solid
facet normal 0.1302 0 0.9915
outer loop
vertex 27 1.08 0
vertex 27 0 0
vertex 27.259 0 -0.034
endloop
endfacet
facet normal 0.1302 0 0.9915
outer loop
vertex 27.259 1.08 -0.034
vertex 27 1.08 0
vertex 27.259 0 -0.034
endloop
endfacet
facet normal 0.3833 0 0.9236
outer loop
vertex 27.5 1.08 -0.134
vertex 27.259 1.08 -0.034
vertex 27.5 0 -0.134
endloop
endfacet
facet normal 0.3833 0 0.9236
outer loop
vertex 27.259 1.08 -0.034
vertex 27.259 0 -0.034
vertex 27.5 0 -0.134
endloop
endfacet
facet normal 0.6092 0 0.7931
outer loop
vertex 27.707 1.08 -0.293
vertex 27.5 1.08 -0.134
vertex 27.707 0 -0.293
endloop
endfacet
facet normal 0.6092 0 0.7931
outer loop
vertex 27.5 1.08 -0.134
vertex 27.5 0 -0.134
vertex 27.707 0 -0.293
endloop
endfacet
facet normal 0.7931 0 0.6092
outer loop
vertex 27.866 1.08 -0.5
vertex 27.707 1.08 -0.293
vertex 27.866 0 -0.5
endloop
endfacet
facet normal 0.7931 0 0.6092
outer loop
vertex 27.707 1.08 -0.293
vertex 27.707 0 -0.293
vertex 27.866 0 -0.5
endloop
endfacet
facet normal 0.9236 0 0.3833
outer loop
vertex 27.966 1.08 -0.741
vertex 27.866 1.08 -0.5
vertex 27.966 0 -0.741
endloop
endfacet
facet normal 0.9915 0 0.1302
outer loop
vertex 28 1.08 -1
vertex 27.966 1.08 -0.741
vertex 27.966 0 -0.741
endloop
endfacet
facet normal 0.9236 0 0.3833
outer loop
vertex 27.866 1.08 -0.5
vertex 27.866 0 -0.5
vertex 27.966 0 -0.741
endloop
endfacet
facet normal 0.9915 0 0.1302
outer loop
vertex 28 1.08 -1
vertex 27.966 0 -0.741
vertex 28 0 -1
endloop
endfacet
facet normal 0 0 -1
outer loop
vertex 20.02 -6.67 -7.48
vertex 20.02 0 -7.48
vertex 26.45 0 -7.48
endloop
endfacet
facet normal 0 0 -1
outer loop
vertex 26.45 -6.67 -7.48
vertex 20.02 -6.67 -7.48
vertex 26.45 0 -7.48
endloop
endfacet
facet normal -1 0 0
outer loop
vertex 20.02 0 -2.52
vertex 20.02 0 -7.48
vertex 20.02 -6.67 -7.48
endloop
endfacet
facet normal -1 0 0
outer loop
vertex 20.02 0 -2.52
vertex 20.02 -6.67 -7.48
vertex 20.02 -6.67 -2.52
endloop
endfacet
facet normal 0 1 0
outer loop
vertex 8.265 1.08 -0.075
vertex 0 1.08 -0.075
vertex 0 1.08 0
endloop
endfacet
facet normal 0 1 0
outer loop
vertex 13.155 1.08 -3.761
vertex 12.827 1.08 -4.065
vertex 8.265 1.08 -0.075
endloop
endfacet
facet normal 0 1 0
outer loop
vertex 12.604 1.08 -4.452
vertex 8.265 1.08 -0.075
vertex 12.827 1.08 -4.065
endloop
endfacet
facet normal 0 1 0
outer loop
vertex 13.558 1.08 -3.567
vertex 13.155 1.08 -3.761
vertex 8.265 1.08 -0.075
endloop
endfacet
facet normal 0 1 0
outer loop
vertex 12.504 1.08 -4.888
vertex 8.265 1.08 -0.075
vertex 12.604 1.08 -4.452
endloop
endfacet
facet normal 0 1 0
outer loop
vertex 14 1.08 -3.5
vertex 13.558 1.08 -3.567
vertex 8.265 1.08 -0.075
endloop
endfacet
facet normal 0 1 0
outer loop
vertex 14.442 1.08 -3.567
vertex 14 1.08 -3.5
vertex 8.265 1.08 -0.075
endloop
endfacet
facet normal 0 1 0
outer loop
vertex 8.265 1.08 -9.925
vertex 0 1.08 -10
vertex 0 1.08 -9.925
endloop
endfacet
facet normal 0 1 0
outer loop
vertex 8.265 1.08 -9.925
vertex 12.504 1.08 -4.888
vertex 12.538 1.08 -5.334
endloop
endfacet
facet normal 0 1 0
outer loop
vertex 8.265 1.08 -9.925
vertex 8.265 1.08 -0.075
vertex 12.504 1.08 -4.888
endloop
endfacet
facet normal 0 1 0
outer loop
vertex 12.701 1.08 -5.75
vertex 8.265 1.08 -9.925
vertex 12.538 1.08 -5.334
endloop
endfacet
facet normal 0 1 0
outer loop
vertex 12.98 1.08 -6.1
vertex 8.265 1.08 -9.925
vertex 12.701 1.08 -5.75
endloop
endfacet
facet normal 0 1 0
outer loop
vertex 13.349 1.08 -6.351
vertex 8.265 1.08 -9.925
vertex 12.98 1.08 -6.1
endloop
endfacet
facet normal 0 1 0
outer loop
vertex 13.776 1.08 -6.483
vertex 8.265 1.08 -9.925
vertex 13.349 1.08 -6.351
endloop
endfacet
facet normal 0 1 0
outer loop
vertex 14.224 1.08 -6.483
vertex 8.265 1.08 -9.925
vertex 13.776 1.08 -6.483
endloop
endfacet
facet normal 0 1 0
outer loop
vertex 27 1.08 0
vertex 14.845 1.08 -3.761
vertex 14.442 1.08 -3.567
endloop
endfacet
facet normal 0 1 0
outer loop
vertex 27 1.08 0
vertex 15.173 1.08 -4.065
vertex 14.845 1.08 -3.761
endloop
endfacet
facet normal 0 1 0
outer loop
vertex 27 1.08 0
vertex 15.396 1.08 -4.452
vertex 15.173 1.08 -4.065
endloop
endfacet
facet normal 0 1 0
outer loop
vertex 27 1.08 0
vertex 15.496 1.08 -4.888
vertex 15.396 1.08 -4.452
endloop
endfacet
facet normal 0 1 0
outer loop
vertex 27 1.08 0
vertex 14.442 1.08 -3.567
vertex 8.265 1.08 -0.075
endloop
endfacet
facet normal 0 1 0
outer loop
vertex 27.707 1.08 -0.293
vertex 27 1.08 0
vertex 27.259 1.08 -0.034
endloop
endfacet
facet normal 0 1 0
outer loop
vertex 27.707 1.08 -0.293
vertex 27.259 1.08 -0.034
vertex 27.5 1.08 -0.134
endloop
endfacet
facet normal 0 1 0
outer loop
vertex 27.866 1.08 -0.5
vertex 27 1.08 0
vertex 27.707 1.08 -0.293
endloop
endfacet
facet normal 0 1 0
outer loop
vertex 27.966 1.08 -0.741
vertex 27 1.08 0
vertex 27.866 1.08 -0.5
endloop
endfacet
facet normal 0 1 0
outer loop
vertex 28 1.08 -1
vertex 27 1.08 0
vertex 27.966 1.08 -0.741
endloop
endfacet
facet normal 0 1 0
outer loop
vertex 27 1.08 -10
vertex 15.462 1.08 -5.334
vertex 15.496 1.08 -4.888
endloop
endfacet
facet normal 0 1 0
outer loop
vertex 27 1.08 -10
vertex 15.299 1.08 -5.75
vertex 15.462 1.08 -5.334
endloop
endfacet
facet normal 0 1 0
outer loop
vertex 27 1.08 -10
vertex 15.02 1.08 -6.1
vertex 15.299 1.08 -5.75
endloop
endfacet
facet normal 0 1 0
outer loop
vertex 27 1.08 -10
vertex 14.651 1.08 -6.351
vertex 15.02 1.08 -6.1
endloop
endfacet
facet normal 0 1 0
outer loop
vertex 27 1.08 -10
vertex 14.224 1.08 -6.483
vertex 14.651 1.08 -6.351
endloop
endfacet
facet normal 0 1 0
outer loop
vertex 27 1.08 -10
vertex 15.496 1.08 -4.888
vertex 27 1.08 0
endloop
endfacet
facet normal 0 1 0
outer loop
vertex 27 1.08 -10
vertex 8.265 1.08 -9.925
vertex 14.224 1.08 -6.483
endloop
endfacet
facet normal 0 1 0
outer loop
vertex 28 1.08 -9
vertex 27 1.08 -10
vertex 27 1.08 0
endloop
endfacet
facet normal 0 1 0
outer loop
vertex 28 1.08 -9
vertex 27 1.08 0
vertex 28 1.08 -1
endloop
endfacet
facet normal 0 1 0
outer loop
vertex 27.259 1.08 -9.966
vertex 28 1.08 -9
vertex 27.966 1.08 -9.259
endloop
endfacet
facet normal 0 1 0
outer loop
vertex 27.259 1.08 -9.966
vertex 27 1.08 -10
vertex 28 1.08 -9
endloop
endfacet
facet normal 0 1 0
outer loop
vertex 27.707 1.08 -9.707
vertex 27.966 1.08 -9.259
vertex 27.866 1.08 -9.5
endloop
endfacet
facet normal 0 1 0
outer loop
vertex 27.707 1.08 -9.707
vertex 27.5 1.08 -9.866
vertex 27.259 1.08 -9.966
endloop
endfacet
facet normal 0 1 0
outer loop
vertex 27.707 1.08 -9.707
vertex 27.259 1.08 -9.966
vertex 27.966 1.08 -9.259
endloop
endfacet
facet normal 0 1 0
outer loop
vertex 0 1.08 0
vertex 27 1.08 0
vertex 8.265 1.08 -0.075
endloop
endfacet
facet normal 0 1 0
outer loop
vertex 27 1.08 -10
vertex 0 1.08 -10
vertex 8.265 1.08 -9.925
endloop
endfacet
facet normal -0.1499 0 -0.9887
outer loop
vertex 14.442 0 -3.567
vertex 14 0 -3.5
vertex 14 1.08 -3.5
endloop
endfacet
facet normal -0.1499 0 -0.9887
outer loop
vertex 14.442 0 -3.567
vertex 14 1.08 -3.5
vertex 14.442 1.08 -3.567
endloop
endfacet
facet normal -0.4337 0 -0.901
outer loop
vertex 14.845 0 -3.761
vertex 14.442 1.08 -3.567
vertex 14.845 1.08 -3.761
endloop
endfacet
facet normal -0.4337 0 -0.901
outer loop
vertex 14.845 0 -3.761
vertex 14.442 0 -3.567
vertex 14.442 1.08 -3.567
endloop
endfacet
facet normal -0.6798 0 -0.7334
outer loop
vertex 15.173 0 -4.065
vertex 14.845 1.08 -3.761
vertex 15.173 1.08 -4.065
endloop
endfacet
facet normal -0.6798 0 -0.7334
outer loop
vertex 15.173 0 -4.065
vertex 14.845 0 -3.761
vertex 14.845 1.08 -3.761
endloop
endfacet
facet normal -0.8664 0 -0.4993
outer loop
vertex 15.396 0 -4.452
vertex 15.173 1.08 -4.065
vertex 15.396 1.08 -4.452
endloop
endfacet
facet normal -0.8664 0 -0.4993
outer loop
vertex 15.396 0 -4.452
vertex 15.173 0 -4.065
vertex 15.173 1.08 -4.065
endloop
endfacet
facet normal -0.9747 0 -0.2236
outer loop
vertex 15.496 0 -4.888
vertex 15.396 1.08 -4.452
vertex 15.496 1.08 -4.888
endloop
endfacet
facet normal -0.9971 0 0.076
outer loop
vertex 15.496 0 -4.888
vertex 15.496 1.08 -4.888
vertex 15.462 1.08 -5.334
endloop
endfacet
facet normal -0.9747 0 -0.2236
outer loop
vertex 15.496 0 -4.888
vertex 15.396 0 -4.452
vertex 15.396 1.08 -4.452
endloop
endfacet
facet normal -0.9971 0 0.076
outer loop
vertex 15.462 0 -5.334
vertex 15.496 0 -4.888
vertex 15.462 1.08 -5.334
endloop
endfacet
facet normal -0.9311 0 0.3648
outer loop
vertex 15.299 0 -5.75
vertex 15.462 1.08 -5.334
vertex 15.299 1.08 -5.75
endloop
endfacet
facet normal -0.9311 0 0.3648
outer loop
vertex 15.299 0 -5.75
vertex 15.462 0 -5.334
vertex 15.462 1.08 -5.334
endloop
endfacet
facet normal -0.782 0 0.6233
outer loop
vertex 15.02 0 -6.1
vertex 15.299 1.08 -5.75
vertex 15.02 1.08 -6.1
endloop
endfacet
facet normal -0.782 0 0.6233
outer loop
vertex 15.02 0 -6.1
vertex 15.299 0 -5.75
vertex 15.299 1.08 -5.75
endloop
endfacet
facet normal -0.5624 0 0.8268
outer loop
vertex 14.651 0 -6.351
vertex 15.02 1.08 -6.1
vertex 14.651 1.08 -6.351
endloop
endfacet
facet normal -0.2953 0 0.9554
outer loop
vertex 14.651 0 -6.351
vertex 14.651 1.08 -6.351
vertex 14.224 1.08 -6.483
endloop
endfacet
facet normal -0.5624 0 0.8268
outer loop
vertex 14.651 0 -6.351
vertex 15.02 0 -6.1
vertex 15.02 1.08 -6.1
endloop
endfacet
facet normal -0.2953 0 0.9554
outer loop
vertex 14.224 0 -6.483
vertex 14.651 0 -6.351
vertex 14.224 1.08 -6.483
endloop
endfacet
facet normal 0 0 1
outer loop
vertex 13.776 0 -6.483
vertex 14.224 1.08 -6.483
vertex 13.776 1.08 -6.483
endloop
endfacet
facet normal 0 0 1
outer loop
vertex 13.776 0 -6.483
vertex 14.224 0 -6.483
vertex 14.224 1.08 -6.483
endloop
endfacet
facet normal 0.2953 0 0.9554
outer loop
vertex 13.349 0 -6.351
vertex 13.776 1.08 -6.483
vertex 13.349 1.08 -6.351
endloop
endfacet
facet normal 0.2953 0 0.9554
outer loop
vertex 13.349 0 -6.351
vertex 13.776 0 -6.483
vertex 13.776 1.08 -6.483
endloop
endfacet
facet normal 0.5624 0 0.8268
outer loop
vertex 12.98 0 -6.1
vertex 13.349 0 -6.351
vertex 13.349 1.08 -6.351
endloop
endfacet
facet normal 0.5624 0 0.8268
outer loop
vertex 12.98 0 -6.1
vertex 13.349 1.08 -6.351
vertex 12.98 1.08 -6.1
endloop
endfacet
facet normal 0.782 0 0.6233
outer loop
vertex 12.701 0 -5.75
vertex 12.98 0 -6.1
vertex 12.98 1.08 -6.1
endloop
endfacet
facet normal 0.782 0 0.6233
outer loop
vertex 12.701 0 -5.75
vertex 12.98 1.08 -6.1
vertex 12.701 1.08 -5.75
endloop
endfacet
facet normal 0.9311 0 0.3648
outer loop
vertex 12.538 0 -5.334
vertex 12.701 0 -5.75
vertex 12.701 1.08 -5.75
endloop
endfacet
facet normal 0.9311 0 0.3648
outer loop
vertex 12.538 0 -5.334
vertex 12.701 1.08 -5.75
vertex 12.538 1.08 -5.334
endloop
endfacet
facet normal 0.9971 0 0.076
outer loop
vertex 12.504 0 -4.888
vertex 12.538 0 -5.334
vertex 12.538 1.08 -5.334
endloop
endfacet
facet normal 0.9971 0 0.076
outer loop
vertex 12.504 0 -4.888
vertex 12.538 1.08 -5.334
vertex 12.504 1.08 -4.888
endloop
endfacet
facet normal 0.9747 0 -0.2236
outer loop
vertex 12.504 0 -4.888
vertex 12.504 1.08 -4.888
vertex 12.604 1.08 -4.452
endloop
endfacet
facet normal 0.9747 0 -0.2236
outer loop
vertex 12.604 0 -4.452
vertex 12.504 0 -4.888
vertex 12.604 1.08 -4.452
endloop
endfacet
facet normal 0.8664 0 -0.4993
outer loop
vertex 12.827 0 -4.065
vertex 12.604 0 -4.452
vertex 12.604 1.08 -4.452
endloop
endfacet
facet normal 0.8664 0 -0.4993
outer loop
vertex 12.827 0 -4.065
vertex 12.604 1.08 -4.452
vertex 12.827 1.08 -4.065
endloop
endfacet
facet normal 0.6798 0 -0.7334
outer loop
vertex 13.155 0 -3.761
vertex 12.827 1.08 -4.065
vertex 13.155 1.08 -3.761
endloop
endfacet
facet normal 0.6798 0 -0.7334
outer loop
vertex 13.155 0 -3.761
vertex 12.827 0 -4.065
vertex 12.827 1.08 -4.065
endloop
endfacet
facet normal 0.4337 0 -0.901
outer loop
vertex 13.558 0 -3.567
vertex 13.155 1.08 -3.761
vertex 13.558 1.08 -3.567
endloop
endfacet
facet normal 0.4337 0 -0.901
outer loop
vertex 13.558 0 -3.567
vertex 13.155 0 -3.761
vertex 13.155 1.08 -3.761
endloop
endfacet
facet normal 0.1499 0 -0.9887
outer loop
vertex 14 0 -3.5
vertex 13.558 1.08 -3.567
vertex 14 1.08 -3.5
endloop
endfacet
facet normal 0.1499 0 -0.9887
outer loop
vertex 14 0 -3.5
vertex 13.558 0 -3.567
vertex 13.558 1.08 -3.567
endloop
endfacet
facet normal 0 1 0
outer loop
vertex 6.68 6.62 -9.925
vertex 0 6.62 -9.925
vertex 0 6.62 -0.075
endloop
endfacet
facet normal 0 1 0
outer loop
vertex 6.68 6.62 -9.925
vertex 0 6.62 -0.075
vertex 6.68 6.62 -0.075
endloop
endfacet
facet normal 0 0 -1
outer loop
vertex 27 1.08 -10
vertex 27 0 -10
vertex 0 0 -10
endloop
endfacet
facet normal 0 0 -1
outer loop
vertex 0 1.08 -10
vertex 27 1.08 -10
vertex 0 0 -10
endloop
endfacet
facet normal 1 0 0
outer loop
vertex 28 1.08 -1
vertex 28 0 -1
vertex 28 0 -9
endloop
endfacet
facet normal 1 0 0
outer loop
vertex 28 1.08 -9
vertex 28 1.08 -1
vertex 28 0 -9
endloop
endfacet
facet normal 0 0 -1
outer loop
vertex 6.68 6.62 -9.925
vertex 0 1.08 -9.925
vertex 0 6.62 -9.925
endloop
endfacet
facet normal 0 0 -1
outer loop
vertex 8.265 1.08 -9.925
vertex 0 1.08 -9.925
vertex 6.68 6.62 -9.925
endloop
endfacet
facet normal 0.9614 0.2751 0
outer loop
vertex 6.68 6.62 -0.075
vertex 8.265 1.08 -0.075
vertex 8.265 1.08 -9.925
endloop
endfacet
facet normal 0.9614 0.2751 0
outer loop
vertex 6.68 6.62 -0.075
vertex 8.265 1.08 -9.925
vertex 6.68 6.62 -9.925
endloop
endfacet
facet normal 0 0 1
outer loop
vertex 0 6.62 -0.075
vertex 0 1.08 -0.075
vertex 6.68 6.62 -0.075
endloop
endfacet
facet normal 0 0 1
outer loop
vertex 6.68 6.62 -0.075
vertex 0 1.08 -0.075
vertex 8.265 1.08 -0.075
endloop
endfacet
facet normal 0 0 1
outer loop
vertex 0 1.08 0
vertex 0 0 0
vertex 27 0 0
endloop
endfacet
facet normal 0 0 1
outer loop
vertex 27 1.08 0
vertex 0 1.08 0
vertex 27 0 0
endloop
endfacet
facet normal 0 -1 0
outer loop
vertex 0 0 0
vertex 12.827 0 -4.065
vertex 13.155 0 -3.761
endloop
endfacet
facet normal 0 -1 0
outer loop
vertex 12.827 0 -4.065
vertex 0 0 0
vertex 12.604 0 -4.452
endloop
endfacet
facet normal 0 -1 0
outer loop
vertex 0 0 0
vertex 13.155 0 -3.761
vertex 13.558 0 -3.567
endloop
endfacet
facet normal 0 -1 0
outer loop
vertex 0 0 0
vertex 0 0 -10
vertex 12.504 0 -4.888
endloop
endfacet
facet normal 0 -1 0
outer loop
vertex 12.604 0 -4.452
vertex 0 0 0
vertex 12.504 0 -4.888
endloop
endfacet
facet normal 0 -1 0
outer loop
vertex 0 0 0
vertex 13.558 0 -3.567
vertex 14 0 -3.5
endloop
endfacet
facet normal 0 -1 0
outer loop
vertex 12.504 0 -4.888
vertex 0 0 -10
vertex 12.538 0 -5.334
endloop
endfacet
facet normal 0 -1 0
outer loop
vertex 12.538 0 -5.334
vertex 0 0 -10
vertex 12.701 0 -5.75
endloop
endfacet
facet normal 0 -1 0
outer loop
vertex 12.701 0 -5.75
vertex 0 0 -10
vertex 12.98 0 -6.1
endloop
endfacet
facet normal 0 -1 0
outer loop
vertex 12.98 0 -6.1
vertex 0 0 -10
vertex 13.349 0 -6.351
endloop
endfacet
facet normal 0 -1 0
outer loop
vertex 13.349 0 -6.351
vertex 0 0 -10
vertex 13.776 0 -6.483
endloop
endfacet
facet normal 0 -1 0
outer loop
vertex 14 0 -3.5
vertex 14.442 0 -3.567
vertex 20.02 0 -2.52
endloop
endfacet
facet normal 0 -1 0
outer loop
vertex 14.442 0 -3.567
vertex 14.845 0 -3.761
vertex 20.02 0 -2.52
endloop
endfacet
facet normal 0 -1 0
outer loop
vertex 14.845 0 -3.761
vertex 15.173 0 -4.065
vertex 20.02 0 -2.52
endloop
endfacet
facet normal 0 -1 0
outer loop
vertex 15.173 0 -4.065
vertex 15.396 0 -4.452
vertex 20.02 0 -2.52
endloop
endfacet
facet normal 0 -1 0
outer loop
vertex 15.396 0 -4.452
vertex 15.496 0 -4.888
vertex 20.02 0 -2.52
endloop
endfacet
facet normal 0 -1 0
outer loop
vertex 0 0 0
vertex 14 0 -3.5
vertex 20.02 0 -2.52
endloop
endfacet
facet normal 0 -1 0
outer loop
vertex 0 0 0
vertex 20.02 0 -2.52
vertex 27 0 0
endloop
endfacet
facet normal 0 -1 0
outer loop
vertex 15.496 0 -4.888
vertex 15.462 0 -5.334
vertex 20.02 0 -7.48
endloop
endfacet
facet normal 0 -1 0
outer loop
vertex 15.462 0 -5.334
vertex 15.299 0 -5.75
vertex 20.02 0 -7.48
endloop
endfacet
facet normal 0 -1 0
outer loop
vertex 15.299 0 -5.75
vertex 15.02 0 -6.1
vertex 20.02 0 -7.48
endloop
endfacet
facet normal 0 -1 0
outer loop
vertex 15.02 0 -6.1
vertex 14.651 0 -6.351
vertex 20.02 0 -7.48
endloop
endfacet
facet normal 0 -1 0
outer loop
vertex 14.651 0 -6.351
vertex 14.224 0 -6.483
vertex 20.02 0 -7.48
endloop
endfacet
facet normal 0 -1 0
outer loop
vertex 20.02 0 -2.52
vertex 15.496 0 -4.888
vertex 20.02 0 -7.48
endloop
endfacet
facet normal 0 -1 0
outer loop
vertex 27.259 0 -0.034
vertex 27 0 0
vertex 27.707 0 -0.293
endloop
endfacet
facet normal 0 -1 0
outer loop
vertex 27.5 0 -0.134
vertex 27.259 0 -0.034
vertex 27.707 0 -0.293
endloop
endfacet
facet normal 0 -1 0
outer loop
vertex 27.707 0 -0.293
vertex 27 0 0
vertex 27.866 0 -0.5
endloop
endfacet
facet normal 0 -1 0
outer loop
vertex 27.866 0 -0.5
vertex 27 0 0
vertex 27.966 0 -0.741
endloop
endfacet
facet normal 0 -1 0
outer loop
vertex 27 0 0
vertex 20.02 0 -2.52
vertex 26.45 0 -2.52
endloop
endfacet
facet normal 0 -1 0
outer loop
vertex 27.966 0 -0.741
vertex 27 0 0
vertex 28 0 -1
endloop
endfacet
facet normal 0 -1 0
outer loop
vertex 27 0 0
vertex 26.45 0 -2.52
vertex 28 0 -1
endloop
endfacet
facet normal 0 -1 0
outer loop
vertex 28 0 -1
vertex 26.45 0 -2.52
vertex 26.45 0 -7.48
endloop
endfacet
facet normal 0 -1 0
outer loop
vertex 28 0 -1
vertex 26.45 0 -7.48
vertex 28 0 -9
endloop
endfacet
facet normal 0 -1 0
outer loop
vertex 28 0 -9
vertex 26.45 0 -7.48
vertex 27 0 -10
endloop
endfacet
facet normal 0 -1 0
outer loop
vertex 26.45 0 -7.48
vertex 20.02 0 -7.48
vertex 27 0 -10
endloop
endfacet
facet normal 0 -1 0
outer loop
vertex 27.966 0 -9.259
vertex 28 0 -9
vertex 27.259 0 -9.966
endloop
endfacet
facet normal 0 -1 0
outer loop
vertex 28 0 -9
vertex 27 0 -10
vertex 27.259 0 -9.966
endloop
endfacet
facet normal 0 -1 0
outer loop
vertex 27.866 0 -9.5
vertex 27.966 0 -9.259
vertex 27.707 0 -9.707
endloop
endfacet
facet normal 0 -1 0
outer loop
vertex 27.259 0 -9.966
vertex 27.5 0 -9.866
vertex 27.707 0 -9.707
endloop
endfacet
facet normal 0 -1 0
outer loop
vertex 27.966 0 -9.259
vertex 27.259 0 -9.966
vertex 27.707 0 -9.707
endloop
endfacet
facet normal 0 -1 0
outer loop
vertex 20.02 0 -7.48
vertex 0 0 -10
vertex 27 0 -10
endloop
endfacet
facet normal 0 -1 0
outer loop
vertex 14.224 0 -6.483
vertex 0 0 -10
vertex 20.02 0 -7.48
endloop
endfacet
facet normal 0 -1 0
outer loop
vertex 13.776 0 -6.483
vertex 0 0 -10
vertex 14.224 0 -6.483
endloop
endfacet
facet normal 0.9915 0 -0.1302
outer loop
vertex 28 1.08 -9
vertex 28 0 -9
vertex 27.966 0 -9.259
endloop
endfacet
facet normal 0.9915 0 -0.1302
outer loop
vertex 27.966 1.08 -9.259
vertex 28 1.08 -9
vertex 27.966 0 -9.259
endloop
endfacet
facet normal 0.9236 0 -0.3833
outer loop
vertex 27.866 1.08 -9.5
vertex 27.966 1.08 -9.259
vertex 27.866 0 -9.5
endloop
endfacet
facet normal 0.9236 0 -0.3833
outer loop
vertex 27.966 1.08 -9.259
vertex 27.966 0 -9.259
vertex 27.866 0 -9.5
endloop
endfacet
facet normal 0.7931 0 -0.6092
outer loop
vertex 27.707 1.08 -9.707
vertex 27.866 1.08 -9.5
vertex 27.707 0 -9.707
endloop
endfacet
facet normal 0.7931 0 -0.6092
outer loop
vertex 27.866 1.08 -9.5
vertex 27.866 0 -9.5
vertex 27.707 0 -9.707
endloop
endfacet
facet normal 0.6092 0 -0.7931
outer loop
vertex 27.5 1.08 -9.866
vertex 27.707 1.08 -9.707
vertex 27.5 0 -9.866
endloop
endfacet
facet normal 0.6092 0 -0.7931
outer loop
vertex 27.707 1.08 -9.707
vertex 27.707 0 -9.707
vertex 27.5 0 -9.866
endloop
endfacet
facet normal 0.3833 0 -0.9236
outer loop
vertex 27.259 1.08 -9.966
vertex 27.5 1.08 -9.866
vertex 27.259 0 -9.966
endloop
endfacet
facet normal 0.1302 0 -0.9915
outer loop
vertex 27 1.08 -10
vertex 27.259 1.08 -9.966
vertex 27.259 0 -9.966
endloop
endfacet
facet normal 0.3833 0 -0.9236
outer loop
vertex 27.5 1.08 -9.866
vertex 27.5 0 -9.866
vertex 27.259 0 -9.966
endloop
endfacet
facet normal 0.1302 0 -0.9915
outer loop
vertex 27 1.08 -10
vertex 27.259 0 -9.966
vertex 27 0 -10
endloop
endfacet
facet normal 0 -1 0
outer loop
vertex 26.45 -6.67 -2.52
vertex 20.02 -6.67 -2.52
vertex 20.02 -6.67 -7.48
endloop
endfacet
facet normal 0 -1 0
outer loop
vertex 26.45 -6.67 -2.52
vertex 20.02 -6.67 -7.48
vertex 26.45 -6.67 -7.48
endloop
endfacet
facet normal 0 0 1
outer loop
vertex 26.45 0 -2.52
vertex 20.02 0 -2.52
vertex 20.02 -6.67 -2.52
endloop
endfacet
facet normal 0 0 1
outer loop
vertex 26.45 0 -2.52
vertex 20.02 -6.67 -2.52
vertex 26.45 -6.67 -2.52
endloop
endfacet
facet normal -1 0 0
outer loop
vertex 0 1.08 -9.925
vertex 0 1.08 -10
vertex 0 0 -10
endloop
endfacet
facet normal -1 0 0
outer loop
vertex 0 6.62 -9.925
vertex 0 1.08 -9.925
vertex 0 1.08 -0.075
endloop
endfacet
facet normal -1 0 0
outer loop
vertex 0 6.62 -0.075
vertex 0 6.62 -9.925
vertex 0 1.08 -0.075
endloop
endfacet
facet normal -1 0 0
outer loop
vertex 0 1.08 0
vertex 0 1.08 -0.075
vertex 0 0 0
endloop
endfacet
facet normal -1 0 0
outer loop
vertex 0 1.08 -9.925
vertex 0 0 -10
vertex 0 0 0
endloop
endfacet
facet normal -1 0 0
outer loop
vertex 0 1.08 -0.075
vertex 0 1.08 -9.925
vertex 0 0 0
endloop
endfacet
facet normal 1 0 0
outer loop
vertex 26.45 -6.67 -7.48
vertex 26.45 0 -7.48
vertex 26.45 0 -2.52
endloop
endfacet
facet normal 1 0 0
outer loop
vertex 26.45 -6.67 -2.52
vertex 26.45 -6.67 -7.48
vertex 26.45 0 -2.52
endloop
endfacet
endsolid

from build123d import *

# Parameters (mm, degrees)
SKETCH1_R           = 1.5
BOSS_EXTRUDE1_DEPTH = 1.08
SKETCH2_W           = 6.68
SKETCH2_H           = 9.85
BOSS_EXTRUDE2_DEPTH = 5.54
BOSS_EXTRUDE3_DEPTH = 9.85
SKETCH4_W           = 6.43
SKETCH4_H           = 4.96
BOSS_EXTRUDE4_DEPTH = 6.67


with BuildPart() as part:
    # Sketch1 → Boss-Extrude1 (new body)
    with BuildSketch(Plane(origin=(0, 0, 0), x_dir=(1, 0, 0), z_dir=(0, 1, 0))):
        with BuildLine():
            Line((0, 0), (27, 0))
            ThreePointArc((27, 0), (27.707106781, 0.292893219), (28, 1))
            Line((28, 1), (28, 9))
            ThreePointArc((28, 9), (27.707106781, 9.707106781), (27, 10))
            Line((27, 10), (0, 10))
            Line((0, 10), (0, 0))
        make_face()
        with Locations(Location((14, 5, 0), (0, 0, 270))):
            Circle(SKETCH1_R, mode=Mode.SUBTRACT)
    extrude(amount=BOSS_EXTRUDE1_DEPTH)

    # Sketch2 → Boss-Extrude2 (add)
    with BuildSketch(Plane(origin=(0, 1.08, 0), x_dir=(1, 0, 0), z_dir=(0, 1, 0))):
        with Locations((3.34, 5)):
            Rectangle(SKETCH2_W, SKETCH2_H)
    extrude(amount=BOSS_EXTRUDE2_DEPTH)

    # Sketch3 → Boss-Extrude3 (add)
    with BuildSketch(Plane.XY.offset(-0.075)):
        Polygon((0, 1.08), (8.264602566, 1.08), (6.68, 6.62), (0, 6.62), align=None)
    extrude(amount=-BOSS_EXTRUDE3_DEPTH)

    # Sketch4 → Boss-Extrude4 (add)
    with BuildSketch(Plane.XZ):
        with Locations((23.235, -5)):
            Rectangle(SKETCH4_W, SKETCH4_H)
    extrude(amount=BOSS_EXTRUDE4_DEPTH)


solid = part.part
